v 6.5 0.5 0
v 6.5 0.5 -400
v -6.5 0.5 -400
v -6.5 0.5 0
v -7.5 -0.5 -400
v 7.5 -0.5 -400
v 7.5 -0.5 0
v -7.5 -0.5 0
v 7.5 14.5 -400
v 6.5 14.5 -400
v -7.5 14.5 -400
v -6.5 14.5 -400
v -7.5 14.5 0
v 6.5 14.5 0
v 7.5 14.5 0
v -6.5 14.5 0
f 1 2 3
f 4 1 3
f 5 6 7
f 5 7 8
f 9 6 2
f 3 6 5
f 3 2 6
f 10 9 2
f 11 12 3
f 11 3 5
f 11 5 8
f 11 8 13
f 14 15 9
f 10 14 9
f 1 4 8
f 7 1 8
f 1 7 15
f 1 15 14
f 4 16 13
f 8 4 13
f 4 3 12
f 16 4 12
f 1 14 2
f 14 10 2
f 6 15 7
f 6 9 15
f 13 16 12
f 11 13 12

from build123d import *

# Parameters (mm, degrees)
SHEET_EXTRUDE_1_1_BACK  = 400
SHEET_EXTRUDE_1_1_DEPTH = 400
THICKEN_1_T1            = 0.5
THICKEN_1_T2            = 0.5


with BuildPart() as body_1:
    # Sheet Extrude 1: a surface, the sketch's curves swept straight by 400 mm
    with BuildLine(Plane.XY.offset(-SHEET_EXTRUDE_1_1_BACK), mode=Mode.PRIVATE) as sheet_extrude_1_1_path:
        Line((7, 14.5), (7, 0))
        Line((7, 0), (-7, 0))
        Line((-7, 0), (-7, 14.5))
    sheet_extrude_1_1 = Shell.extrude(sheet_extrude_1_1_path.wire(), (0 * SHEET_EXTRUDE_1_1_DEPTH, 0 * SHEET_EXTRUDE_1_1_DEPTH, 1 * SHEET_EXTRUDE_1_1_DEPTH))
    add(Solid.thicken(sheet_extrude_1_1, THICKEN_1_T1))
    add(Solid.thicken(sheet_extrude_1_1, -THICKEN_1_T2))


solid = body_1.part
